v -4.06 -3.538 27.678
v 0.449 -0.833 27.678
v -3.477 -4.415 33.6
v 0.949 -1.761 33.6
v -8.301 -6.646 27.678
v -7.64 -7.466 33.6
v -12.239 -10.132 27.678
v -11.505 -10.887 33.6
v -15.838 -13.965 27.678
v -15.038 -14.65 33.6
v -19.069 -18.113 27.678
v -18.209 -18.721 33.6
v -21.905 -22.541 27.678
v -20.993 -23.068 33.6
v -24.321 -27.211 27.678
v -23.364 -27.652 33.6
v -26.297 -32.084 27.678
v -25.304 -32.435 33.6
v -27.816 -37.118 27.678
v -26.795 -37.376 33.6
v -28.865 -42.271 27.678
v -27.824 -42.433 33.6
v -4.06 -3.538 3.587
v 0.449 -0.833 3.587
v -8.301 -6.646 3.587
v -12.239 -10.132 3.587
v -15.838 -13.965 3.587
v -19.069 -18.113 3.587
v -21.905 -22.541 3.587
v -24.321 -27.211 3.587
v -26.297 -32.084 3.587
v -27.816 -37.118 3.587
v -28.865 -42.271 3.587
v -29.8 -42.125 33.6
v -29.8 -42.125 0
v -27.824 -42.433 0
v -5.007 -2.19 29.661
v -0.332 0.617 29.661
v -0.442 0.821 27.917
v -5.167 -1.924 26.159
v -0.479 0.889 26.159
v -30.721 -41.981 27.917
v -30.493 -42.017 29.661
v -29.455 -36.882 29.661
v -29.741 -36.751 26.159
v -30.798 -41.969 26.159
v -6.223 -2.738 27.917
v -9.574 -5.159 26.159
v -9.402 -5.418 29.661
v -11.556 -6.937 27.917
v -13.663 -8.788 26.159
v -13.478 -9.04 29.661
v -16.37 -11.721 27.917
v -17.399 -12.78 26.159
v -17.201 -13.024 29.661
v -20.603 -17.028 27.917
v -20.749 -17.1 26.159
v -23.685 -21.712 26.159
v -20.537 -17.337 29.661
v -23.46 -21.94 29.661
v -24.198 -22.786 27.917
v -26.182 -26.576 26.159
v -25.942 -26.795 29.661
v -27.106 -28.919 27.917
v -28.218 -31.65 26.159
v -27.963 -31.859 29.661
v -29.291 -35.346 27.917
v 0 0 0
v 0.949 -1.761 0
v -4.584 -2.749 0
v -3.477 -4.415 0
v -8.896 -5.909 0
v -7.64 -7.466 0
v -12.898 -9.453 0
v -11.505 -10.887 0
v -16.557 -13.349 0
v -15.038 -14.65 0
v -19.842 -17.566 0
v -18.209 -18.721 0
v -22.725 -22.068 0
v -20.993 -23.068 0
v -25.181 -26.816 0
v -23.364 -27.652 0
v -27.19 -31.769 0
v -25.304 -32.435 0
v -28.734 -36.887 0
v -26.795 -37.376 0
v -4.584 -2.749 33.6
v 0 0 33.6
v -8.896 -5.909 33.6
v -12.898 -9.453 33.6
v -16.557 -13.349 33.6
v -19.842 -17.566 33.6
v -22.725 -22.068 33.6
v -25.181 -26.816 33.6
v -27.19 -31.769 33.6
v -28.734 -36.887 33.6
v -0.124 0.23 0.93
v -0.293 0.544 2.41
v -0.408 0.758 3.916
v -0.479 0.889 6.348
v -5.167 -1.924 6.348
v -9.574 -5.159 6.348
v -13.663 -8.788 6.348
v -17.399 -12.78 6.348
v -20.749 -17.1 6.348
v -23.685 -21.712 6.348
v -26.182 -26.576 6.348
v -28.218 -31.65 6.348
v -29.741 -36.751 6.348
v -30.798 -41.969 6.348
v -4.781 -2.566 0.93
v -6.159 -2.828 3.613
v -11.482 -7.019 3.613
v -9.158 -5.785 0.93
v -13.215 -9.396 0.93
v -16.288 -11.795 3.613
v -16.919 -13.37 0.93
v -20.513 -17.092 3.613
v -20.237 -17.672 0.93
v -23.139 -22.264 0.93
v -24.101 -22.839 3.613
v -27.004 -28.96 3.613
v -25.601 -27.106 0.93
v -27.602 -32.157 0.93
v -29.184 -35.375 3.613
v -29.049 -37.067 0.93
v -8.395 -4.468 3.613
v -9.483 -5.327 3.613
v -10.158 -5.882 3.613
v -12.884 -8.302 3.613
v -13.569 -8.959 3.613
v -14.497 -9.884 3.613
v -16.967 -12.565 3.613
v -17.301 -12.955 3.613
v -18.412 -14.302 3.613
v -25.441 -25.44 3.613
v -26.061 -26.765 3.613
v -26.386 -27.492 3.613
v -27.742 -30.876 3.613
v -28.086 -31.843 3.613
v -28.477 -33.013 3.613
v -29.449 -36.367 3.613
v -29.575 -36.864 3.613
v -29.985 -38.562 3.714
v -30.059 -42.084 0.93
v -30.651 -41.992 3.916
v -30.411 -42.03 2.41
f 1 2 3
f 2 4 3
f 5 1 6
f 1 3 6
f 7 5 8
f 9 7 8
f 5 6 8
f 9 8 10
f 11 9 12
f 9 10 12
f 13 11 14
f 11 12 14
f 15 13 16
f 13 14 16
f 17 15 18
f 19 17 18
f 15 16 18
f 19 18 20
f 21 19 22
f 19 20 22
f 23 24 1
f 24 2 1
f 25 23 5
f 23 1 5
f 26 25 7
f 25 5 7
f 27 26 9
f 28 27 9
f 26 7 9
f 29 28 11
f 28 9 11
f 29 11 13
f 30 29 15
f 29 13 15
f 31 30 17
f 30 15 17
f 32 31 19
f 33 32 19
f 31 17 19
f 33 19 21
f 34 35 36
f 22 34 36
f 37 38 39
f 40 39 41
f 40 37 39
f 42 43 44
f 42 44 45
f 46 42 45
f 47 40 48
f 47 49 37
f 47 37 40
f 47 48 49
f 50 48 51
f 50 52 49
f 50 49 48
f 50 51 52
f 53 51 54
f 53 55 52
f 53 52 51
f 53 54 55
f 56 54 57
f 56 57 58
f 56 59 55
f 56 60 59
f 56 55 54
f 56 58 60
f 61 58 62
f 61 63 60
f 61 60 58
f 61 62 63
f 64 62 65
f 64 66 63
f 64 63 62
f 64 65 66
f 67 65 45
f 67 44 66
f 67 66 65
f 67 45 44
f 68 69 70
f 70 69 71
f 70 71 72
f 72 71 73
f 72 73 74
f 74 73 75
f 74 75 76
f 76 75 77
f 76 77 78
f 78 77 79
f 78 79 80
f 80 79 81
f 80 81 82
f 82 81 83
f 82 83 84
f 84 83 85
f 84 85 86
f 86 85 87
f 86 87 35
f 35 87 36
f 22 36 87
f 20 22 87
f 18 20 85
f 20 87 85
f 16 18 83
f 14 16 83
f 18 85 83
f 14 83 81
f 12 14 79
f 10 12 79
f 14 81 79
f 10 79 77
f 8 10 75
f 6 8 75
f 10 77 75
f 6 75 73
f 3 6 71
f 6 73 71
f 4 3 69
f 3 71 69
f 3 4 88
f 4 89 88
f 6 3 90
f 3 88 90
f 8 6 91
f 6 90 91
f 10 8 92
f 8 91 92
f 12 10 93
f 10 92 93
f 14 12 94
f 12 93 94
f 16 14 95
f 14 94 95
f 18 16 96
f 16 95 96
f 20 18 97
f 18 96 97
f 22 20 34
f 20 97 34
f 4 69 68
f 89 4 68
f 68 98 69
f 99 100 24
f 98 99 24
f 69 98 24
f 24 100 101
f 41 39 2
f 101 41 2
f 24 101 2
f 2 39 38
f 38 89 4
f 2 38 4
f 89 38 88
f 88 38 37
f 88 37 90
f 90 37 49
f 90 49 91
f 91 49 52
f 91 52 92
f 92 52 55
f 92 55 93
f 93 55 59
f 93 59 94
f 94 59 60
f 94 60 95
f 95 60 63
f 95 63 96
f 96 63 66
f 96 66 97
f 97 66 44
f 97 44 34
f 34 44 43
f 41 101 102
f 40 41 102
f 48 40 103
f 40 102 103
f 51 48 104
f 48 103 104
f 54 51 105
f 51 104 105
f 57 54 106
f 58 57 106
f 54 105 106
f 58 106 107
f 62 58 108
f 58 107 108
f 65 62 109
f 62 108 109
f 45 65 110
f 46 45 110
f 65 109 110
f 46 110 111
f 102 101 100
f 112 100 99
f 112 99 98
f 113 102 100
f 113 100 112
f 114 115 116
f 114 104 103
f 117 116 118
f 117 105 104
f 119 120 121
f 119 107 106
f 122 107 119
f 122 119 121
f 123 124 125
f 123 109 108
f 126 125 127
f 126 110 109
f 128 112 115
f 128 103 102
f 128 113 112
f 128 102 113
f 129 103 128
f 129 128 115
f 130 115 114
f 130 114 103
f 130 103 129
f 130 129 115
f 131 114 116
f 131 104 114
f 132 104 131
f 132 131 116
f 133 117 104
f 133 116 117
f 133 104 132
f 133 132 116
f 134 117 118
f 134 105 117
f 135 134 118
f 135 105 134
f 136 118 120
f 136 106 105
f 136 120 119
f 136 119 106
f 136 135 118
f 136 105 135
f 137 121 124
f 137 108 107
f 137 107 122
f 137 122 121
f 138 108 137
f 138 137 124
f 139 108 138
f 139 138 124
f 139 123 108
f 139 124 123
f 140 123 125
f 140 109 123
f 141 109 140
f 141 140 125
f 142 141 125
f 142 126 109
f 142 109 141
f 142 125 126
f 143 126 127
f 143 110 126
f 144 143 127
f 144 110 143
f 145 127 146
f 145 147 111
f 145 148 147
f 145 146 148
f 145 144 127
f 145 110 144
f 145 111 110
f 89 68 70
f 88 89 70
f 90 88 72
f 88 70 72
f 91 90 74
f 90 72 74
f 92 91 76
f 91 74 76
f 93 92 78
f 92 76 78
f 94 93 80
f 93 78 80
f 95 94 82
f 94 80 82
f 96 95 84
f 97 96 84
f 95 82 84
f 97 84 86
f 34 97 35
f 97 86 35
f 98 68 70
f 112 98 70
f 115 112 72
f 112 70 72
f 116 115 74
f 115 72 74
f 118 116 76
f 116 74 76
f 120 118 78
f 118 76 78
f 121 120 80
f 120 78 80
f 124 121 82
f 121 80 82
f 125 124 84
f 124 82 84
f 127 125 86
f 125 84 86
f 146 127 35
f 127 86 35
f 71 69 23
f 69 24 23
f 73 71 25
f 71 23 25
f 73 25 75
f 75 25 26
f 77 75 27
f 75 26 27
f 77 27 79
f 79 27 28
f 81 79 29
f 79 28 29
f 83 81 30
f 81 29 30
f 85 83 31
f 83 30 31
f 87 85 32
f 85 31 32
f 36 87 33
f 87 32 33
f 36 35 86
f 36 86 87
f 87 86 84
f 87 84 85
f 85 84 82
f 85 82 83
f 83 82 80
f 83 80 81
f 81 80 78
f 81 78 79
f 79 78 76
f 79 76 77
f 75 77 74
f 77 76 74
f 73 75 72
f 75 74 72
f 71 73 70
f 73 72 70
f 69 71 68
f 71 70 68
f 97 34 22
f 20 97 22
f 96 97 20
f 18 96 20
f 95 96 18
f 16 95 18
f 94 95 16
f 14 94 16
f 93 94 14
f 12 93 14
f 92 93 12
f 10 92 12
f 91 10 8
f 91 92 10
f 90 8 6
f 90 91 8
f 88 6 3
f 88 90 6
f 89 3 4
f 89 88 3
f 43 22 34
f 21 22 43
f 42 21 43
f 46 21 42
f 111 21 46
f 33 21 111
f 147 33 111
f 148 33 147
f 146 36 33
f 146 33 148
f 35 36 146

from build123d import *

# Parameters (mm, degrees)
F2_DEPTH = 33.6
F5_R     = 20


with BuildPart() as f2:
    # F1 (on Top) → F2 (new body)
    with BuildSketch(Plane.XY):
        with BuildLine():
            Line((0.9486013825, -1.7607258211), (0, 0))
            ThreePointArc((0, 0), (-19.8421488285, -17.5662997323), (-29.80036094, -42.1247965911))
            Line((-29.80036094, -42.1247965911), (-27.8242650699, -42.4330904643))
            ThreePointArc((-27.8242650699, -42.4330904643), (-18.2094047746, -18.721352482), (0.9486013825, -1.7607258211))
        make_face()
    extrude(amount=F2_DEPTH)


with BuildPart() as f4:
    # F4: sweep along a path in F4_path
    with BuildLine(Plane(origin=(0, 0, 33.6), x_dir=(0, -1, 0), z_dir=(0, 0, -1))) as f4_path:
        ThreePointArc((0, 0), (17.5662997323, 19.8421488285), (42.1247965911, 29.80036094))
    # F3 (on face) → F4 (sweep)
    with BuildSketch(Plane(origin=(-7.1238933736, -45.6625885183, 0), x_dir=(0.988047935, -0.1541469366, 0), z_dir=(-0.1541469366, -0.988047935, 0))):
        Polygon((-20.9507767409, 33.6), (-22.9507767409, 33.6), (-22.9507767409, 0), (-20.9507767409, 0), (-22.0040890729, 3.5874471068), (-22.0040890729, 27.6784074476), align=None)
        Polygon((-22.9507767409, 0), (-22.9507767409, 33.6), (-23.9604524097, 27.9237274081), (-23.9604524097, 3.5874471068), align=None)
    sweep(path=f4_path.line)

    # F5
    f5_edges = [f4.edges().sort_by_distance(p)[0] for p in [
        (-20.66642, -16.983185, 27.923727),
        (-20.66642, -16.983185, 3.587447),
    ]]
    fillet(f5_edges, radius=F5_R)


solid = Compound([f2.part, f4.part])
